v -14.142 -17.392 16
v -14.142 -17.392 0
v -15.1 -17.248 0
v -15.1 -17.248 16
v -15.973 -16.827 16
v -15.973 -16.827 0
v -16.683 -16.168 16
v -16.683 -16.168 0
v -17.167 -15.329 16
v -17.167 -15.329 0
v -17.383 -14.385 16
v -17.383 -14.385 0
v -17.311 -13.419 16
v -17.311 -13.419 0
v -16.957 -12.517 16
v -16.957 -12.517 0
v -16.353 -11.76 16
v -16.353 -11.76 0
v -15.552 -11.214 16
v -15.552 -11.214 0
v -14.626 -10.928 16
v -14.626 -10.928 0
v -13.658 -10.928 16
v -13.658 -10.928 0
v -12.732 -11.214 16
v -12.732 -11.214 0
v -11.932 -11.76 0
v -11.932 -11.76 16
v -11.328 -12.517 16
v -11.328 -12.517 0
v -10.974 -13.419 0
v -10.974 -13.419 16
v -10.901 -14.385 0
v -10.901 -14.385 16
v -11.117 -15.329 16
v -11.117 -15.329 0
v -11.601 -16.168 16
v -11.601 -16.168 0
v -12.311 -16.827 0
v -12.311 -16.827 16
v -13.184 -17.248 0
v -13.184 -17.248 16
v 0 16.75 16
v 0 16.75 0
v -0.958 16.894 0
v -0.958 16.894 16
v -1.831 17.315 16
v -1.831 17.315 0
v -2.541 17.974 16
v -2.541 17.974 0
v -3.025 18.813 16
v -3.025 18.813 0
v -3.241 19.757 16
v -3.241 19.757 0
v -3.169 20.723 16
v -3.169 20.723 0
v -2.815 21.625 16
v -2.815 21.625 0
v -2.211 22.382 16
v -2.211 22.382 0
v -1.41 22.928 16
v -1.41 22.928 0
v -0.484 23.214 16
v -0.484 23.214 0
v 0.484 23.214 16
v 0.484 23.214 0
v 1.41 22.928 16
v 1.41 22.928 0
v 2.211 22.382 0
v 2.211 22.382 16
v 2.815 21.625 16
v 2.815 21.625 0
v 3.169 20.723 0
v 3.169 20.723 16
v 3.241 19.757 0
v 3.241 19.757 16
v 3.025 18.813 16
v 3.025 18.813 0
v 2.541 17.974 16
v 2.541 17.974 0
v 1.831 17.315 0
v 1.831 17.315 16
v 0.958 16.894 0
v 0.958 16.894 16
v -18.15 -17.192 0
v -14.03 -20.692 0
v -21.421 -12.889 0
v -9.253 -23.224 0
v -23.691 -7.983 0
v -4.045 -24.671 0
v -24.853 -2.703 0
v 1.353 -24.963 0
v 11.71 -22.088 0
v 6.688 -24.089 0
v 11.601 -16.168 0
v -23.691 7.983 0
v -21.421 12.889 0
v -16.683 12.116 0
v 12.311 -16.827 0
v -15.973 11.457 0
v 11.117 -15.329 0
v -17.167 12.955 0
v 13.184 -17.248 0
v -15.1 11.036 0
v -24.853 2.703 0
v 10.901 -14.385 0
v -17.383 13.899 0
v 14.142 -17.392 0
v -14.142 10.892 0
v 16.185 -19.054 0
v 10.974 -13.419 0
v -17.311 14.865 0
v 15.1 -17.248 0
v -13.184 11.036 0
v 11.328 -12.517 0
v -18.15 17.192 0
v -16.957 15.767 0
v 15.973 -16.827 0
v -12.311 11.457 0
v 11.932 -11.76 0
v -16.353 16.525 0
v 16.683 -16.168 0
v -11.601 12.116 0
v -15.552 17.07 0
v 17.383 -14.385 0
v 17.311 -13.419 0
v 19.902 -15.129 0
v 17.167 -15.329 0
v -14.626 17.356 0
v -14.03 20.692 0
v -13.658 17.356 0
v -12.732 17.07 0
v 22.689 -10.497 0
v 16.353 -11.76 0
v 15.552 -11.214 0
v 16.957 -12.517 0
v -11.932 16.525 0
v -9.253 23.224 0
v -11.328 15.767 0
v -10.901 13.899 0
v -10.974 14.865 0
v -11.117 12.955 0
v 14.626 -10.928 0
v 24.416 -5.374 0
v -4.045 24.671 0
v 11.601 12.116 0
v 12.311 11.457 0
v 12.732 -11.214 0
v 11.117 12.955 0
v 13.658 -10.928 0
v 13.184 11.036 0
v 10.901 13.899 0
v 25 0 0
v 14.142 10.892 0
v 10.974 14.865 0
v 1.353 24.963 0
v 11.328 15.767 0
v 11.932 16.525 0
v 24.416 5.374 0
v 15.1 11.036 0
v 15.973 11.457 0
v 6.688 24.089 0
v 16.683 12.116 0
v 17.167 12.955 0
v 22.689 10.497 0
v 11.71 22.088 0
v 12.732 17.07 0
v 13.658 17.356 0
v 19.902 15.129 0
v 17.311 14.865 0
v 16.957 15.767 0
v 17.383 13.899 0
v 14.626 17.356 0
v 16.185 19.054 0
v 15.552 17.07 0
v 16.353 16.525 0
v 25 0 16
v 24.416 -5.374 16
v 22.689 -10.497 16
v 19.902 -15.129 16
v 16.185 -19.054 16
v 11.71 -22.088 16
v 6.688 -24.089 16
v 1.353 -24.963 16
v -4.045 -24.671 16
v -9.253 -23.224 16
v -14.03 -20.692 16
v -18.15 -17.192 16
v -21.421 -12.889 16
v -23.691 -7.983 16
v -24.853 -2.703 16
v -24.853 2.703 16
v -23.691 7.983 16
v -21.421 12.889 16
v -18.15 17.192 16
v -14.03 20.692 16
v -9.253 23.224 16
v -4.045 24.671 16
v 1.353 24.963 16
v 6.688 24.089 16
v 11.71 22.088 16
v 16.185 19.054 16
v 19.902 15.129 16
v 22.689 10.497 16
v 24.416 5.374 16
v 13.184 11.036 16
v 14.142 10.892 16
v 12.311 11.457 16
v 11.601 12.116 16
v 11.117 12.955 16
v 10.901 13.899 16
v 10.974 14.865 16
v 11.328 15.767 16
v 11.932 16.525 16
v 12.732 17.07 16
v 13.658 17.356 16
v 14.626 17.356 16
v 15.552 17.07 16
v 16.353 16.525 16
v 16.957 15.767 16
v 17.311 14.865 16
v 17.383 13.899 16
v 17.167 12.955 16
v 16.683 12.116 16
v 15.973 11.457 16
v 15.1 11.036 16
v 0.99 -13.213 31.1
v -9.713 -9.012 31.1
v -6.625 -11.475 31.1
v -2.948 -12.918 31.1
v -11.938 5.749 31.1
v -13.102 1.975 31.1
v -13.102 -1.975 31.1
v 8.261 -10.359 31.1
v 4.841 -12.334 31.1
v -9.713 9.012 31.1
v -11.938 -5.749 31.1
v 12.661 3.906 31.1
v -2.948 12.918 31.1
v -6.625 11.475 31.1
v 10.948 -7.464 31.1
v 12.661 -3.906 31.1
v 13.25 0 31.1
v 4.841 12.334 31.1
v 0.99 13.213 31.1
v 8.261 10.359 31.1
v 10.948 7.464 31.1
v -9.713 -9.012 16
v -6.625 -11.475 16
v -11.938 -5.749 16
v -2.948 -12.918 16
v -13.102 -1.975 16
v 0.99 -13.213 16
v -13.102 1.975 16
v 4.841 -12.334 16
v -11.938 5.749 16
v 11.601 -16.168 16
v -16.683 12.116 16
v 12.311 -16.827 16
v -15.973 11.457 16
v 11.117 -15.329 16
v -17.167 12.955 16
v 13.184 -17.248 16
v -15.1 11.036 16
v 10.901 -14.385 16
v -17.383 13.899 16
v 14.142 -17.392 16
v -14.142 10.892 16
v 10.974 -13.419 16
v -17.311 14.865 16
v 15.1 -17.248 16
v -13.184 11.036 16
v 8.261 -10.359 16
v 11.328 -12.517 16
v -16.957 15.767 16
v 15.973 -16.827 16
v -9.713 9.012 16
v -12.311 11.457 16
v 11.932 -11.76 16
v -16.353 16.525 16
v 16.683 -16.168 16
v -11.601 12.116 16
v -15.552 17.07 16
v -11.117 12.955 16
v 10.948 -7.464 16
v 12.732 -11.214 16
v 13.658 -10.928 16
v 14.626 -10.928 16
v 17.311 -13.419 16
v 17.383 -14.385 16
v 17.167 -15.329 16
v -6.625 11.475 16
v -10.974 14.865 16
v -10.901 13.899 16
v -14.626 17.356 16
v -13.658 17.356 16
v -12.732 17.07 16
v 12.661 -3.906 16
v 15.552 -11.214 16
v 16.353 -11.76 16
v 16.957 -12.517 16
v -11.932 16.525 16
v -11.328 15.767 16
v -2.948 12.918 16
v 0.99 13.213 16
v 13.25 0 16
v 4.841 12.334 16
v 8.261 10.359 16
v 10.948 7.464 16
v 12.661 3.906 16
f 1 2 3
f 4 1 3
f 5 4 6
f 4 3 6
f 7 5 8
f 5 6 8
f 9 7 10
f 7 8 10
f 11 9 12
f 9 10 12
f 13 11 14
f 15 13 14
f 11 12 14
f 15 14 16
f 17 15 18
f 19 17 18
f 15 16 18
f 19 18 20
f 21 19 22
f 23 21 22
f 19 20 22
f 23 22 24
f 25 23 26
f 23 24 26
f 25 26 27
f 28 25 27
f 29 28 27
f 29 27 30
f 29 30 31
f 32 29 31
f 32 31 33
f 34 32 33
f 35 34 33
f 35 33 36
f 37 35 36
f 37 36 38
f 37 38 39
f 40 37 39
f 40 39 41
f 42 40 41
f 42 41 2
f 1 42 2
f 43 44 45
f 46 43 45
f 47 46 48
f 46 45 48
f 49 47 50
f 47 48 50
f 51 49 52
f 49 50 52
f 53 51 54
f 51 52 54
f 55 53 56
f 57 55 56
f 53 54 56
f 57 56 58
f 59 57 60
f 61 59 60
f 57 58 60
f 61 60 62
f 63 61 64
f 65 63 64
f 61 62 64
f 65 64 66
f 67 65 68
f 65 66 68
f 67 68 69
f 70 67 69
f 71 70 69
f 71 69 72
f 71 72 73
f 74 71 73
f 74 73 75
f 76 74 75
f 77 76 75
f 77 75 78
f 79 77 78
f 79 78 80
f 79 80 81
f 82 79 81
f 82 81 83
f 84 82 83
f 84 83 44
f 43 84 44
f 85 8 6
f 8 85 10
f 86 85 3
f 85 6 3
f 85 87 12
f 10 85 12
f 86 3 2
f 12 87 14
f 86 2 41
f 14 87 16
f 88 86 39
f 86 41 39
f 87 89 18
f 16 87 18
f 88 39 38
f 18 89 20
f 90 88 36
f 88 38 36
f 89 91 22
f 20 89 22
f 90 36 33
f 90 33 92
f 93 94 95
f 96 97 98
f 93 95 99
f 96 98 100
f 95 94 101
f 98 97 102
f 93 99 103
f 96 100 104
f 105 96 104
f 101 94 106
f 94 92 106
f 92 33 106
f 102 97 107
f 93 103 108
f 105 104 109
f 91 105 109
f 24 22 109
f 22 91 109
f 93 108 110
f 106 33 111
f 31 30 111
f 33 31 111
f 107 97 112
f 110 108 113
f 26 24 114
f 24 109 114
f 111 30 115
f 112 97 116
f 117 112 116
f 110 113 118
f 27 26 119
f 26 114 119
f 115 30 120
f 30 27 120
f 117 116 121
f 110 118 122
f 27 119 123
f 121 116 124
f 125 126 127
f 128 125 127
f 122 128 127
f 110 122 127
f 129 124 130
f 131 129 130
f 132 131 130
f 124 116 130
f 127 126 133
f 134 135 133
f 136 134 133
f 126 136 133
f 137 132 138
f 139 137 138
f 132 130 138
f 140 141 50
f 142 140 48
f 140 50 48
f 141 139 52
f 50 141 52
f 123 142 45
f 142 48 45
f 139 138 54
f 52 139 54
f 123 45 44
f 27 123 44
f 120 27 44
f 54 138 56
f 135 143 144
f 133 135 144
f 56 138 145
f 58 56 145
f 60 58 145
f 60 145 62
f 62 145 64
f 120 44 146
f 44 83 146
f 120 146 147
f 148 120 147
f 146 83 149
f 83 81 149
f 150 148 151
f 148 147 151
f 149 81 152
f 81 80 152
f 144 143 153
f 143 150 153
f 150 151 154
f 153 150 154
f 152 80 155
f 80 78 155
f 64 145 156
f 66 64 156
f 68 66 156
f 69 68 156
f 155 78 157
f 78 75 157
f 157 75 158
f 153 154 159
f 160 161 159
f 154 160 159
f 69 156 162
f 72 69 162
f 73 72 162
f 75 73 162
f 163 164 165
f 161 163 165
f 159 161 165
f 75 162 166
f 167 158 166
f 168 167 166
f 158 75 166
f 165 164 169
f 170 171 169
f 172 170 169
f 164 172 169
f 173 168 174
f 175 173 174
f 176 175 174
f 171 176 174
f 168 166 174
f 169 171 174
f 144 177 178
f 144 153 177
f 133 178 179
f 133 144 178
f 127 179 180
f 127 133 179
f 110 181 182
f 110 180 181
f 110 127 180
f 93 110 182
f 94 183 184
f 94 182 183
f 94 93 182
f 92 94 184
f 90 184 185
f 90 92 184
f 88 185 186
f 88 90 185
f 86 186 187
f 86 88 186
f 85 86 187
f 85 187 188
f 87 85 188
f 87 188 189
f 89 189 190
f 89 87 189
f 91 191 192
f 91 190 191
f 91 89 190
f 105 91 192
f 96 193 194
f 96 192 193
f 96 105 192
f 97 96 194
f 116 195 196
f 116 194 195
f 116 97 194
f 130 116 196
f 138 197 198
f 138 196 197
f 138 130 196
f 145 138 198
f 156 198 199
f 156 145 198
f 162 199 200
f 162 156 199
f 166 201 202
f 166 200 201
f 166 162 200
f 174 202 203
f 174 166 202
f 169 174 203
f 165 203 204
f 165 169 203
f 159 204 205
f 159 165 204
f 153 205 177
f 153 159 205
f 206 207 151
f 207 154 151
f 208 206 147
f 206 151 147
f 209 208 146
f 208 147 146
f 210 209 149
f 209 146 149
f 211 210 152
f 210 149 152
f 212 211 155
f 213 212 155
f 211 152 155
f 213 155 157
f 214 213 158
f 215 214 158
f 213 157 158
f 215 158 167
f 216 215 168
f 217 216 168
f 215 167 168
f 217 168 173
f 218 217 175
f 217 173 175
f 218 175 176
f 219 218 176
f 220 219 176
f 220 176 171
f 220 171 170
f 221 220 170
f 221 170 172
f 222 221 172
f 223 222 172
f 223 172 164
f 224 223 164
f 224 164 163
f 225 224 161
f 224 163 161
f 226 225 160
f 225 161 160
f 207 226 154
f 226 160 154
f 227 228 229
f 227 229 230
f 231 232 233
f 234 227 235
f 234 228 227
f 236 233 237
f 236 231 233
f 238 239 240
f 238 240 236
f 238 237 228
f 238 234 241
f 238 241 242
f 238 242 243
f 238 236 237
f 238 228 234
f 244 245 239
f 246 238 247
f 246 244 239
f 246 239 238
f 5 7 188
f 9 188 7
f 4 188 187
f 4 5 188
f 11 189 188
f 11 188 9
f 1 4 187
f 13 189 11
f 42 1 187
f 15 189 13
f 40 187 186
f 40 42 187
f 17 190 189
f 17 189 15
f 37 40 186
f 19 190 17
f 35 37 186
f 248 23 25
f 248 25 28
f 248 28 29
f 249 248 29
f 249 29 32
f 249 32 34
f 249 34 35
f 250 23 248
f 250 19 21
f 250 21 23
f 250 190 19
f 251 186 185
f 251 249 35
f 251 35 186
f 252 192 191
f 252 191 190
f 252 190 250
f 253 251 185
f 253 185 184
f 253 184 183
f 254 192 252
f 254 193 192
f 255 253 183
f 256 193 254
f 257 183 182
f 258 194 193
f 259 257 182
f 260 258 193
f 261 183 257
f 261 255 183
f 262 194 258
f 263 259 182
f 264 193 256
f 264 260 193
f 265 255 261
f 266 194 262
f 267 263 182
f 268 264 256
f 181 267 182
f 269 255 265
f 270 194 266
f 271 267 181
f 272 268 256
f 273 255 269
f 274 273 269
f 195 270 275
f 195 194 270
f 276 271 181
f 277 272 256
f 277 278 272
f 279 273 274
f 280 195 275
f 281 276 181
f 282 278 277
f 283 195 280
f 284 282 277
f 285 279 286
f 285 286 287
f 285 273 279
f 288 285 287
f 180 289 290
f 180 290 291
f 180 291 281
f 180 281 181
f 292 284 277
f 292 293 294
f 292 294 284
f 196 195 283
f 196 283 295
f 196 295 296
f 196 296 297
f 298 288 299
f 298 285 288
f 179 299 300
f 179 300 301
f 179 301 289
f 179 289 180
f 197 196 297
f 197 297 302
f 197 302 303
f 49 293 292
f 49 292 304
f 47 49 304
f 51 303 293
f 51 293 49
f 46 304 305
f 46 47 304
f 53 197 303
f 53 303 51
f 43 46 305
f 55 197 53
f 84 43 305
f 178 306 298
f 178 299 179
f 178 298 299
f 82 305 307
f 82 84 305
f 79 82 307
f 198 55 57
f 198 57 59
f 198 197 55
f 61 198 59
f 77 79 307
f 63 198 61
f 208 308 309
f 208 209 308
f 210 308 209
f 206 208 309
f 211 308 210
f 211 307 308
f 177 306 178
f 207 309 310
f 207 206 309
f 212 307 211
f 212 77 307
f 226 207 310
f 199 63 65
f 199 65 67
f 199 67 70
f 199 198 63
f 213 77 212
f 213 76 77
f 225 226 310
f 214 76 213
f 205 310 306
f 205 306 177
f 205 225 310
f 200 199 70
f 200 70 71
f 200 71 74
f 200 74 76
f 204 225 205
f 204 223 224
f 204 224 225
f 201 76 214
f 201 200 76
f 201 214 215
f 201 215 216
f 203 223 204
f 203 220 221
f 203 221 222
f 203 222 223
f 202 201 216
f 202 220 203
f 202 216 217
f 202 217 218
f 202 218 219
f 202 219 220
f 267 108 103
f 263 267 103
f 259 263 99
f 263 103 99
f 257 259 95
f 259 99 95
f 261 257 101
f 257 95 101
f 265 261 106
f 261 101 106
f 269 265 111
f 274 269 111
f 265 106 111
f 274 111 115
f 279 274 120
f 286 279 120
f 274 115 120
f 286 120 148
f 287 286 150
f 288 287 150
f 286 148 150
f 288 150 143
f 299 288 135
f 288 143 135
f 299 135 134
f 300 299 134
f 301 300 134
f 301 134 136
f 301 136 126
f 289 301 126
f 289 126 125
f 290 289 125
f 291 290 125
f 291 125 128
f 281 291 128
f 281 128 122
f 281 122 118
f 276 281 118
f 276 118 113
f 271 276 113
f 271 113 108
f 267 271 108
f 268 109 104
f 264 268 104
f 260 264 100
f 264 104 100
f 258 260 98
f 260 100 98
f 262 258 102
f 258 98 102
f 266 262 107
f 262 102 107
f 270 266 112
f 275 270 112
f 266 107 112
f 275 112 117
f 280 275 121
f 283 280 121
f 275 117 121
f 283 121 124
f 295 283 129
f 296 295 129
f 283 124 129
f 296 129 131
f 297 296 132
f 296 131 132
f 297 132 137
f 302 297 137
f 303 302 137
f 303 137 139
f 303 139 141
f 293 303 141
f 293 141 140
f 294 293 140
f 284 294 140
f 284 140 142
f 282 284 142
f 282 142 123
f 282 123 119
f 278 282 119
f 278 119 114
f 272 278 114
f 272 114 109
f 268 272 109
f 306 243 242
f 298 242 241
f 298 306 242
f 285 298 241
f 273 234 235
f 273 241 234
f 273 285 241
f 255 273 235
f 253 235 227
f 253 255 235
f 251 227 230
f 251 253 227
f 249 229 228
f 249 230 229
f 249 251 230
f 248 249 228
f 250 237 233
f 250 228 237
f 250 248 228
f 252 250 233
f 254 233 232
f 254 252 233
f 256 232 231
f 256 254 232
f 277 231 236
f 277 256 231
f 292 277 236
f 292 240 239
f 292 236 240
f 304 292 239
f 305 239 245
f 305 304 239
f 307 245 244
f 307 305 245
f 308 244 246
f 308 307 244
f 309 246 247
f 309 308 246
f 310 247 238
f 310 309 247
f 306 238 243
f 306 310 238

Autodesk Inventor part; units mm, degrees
ref_plane "YZ Plane" through (0, 0, 0) normal (1, 0, 0) x (0, 1, 0)
ref_plane "XZ Plane" through (0, 0, 0) normal (0, 1, 0) x (-1, 0, 0)
sketch "Sketch1" plane through (0, 0, 0) normal (0, 0, 1) x (1, 0, 0)
  circle A0 centre (0, 0) radius 25
  dimension "d0" = 50
extrude "Extrusion1" add sketch "Sketch1" along normal blind 16
sketch "Sketch2" plane through (0, 0, 16) normal (0, 0, 1) x (1, 0, 0)
  line L0 (0, 0) -> (-14.1421, 14.1421)
  line L1 (0, 0) -> (-17.9491, 0)
  point P0 (-14.1421, -14.1421)
  point P1 (-14.1421, -14.1421)
  point P2 (14.1421, -14.1421)
  point P3 (14.1421, -14.1421)
  point P4 (14.1421, 14.1421)
  point P5 (14.1421, 14.1421)
  point P6 (0, 20)
  dimension "d3" = 45
  dimension "d4" = 20
  dimension "d7" = 360
  dimension "d9" = 20
hole "Hole1" at (-14.1421, 14.1421, 16) at (-14.1421, -14.1421, 16) at (14.1421, -14.1421, 16) at (14.1421, 14.1421, 16) at (0, 20, 16) direction (0, 0, -1) diameter 6.5 end through all
sketch "Sketch3" plane through (0, 0, 16) normal (0, 0, 1) x (1, 0, 0)
  circle A0 centre (0, 0) radius 13.25
  dimension "d17" = 26.5
extrude "Extrusion2" add sketch "Sketch3" along normal blind 15.1
sketch "Sketch4" plane through (0, 0, 31.1) normal (0, 0, 1) x (1, 0, 0)
  circle A0 centre (0, 0) radius 13.25 projected
  point P0 (13.25, 0)
ref_plane "Work Plane1" through (13.25, 0, 31.1) normal (1, 0, 0) x (0, 1, 0)
properties part number "SoporteIRB"
